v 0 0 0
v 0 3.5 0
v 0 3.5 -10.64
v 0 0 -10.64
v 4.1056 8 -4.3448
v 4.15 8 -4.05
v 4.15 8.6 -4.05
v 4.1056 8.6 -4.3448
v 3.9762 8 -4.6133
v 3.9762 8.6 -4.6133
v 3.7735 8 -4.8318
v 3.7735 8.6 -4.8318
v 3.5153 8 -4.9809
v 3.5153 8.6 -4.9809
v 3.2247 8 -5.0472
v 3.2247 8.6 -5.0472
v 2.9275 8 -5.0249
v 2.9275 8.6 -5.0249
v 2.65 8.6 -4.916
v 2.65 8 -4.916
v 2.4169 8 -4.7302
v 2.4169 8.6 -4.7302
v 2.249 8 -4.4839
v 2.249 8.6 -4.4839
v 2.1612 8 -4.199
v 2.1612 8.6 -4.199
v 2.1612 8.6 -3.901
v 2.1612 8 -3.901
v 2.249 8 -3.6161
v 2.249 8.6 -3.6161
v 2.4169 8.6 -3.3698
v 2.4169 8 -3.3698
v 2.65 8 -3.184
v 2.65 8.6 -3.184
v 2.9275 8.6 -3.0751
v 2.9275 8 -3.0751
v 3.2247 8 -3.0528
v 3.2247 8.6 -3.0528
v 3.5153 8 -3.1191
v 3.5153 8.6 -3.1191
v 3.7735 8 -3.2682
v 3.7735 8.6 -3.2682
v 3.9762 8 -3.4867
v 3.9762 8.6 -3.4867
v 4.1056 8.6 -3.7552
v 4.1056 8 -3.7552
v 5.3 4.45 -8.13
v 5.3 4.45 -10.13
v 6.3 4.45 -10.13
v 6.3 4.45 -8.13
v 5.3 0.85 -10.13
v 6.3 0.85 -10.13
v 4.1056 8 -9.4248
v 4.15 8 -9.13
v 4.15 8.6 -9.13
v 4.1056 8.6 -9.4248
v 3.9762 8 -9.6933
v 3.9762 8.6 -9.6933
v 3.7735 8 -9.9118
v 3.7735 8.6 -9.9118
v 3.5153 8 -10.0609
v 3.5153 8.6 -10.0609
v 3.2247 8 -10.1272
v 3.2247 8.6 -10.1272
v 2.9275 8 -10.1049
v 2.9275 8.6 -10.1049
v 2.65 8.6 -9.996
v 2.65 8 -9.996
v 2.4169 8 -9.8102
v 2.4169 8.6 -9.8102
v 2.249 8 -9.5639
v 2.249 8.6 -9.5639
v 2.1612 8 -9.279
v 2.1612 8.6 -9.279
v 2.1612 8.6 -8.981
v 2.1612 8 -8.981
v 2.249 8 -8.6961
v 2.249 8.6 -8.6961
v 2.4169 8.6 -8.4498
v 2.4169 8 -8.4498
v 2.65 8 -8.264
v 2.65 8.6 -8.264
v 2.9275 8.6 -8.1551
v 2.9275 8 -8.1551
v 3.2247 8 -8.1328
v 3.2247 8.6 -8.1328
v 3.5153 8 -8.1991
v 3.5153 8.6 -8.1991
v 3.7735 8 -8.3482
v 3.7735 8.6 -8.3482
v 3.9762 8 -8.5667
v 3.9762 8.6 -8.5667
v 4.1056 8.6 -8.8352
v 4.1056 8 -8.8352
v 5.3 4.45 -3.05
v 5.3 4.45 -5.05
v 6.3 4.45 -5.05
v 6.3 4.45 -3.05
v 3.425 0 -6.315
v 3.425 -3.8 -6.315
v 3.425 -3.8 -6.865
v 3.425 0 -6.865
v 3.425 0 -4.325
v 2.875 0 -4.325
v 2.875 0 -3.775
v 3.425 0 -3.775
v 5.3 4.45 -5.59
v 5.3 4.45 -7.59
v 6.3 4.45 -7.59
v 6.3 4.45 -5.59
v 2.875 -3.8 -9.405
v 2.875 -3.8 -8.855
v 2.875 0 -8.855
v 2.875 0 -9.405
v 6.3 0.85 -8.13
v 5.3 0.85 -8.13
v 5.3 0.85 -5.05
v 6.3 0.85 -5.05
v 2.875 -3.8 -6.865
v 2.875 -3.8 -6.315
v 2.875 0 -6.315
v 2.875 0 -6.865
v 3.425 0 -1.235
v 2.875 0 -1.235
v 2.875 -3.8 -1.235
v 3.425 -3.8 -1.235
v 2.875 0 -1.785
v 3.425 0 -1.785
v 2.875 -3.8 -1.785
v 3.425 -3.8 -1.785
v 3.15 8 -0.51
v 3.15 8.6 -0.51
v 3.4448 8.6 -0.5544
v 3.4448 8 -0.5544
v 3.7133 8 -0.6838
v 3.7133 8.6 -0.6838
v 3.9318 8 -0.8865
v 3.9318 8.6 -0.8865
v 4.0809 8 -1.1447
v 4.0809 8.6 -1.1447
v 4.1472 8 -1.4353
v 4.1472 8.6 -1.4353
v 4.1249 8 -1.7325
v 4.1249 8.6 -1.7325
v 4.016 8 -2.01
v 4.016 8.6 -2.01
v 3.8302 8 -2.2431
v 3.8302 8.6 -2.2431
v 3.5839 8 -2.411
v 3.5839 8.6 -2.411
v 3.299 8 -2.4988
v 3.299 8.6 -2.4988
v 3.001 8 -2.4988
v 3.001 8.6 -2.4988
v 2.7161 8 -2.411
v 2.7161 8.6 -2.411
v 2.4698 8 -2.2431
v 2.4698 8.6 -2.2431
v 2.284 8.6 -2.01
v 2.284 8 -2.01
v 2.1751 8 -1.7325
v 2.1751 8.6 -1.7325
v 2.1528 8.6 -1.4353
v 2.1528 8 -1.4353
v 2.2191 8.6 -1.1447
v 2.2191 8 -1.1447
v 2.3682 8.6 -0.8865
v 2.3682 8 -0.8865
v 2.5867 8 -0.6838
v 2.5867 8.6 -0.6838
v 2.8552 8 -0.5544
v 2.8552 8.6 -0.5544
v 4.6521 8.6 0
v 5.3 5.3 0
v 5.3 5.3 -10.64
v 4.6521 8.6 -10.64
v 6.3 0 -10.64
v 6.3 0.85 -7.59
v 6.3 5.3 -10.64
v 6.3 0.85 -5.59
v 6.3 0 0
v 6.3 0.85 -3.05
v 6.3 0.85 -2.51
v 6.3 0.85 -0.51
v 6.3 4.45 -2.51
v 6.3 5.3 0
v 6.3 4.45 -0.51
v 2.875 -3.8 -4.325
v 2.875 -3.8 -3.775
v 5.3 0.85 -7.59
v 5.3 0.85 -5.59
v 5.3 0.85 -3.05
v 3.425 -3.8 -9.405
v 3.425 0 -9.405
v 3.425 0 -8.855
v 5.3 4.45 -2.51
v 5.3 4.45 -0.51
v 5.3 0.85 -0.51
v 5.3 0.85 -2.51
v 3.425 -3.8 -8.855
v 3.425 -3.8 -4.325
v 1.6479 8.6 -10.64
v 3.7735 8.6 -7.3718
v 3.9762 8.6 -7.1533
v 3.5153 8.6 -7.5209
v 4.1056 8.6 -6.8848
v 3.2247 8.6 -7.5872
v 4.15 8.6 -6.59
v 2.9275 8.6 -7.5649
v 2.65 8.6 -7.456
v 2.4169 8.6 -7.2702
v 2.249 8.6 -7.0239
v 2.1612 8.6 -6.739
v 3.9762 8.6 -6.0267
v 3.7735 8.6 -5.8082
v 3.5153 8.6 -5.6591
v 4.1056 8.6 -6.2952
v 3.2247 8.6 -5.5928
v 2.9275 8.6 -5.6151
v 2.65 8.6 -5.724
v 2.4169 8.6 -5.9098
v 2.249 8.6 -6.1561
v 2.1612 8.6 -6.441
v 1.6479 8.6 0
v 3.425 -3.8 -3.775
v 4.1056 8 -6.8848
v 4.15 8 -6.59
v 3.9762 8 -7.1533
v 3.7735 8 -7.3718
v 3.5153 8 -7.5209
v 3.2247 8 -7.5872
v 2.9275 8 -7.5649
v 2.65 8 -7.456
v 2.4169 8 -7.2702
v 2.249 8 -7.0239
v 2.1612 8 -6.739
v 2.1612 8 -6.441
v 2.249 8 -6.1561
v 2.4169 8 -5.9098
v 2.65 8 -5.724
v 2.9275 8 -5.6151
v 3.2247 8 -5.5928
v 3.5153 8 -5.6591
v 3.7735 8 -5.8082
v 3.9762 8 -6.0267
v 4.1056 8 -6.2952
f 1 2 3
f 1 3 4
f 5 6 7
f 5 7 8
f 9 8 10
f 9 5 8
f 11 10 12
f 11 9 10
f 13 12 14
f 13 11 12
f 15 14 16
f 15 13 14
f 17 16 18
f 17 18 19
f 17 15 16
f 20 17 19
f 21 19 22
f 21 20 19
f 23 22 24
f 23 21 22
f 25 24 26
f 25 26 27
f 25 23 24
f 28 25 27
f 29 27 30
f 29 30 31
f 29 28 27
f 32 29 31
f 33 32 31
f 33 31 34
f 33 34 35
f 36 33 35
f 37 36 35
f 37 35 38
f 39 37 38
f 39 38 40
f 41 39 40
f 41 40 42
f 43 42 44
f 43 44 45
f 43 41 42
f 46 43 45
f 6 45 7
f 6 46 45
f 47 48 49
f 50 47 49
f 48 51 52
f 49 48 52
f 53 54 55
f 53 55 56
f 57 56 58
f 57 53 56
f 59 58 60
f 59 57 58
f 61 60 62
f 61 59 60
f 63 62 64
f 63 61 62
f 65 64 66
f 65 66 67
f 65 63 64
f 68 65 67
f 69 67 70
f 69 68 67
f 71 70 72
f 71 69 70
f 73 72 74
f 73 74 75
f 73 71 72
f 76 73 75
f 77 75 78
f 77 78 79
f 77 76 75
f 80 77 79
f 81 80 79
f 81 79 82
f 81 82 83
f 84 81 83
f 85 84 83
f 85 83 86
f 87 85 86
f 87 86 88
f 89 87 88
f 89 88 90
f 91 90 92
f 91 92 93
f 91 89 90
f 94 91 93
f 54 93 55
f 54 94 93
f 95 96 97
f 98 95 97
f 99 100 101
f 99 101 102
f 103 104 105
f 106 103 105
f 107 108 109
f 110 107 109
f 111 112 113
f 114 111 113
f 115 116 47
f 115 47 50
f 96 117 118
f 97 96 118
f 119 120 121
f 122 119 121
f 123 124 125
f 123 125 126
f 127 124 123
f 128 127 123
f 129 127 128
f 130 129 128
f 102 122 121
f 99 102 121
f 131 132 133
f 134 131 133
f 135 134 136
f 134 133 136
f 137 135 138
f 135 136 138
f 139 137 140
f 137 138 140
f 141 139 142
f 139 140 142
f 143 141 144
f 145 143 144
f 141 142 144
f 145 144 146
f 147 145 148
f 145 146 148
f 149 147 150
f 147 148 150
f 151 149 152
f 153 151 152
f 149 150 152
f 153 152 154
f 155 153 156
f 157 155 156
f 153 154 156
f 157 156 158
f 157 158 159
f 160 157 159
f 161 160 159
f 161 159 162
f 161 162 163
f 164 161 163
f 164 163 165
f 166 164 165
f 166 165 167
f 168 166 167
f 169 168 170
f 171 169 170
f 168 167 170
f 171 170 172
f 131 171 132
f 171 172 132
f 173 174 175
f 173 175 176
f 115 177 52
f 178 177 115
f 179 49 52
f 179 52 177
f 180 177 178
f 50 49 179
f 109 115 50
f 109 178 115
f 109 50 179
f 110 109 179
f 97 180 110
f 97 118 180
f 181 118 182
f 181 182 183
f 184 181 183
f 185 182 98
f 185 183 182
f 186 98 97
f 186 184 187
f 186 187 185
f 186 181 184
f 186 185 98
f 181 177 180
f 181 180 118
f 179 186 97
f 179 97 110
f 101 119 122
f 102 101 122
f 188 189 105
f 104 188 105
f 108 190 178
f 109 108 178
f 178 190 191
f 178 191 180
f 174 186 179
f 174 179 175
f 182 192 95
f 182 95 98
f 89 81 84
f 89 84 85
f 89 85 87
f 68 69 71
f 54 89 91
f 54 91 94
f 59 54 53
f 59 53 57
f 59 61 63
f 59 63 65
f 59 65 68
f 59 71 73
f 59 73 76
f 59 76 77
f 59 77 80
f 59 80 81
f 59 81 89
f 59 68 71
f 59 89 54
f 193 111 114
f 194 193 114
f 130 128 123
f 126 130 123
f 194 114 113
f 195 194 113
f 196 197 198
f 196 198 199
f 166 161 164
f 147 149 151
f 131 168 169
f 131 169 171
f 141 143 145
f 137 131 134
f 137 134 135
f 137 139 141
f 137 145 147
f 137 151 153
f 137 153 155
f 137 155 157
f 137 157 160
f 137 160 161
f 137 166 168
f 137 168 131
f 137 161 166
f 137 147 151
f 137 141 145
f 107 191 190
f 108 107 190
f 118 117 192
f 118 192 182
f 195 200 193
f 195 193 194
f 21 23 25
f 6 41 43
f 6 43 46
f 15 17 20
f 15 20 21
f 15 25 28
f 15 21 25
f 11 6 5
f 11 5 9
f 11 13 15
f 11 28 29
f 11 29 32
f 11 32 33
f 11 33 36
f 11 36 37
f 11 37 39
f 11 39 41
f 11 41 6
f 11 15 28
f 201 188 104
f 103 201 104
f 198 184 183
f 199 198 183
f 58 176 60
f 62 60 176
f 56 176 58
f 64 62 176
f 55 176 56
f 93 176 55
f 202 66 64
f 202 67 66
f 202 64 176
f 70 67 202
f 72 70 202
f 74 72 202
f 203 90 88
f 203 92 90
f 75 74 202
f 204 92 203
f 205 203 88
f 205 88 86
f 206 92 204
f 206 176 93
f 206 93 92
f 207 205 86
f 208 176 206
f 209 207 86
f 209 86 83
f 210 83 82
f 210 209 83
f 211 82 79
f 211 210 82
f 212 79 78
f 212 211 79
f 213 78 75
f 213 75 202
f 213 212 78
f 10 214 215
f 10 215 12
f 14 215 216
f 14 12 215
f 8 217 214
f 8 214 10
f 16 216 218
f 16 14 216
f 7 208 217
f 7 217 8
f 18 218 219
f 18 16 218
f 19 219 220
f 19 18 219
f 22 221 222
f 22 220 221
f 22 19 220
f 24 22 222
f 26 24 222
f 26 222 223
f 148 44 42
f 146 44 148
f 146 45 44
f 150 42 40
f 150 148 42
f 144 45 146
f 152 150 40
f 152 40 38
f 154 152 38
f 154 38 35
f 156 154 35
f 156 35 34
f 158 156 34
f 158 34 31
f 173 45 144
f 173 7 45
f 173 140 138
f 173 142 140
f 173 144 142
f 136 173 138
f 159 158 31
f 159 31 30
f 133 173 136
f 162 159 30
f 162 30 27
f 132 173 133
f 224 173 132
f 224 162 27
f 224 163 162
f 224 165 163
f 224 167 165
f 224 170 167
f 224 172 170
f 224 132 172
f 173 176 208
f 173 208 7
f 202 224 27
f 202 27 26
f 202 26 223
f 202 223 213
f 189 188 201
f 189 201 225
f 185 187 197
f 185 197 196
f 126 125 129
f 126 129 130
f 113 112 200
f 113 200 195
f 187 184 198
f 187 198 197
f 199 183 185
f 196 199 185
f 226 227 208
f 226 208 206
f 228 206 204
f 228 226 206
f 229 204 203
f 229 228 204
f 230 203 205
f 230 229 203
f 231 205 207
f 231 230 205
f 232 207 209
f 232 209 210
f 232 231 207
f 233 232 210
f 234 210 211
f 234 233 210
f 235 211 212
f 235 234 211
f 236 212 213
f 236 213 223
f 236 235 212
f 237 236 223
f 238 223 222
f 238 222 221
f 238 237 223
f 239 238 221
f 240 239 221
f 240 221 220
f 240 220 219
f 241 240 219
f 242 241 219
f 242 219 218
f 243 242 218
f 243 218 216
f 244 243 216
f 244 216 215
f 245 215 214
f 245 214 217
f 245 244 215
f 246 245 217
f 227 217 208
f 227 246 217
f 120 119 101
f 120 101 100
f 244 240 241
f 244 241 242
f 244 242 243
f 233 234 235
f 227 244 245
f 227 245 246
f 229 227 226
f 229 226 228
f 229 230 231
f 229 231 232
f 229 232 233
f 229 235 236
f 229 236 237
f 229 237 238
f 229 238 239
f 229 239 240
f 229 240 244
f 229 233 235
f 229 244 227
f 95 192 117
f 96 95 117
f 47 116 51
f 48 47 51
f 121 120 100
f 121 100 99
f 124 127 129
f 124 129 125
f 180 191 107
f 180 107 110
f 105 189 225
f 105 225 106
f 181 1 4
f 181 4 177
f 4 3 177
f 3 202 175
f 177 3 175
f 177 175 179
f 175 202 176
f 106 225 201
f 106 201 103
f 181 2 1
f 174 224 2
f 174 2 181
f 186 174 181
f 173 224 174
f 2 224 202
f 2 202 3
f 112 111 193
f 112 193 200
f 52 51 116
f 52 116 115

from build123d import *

# Parameters (mm, degrees)
BOSS_EXTRUDE1_DEPTH   = 10.64
SKETCH3_R             = 1
CUT_EXTRUDE1_DEPTH    = 0.6
SKETCH4_W             = 2
SKETCH4_H             = 3.6
CUT_EXTRUDE2_DEPTH    = 1
SKETCH5_W             = 0.55
SKETCH5_H             = 0.55
BOSS_EXTRUDE2_DEPTH   = 3.8
LPATTERN1_START       = 2.875
LPATTERN1_OUTLINE_W   = 3.8
LPATTERN1_OUTLINE_H   = 0.55
LPATTERN1_DEPTH       = 0.55
LPATTERN1_2_OUTLINE_W = 3.8
LPATTERN1_2_OUTLINE_H = 0.55
LPATTERN1_2_DEPTH     = 0.55
LPATTERN1_3_OUTLINE_W = 3.8
LPATTERN1_3_OUTLINE_H = 0.55
LPATTERN1_3_DEPTH     = 0.55
LPATTERN1_START_2     = 0.85
LPATTERN1_4_OUTLINE_W = 1
LPATTERN1_4_OUTLINE_H = 2
LPATTERN1_4_DEPTH     = 3.6
LPATTERN1_START_3     = 8
LPATTERN1_5_OUTLINE_R = 1
LPATTERN1_5_DEPTH     = 0.6


# Read off the part's stored shape, not the designer's step: LPattern1
with BuildPart() as part:
    # Sketch2 → Boss-Extrude1 (new body)
    with BuildSketch(Plane.XY):
        Polygon((6.3, 5.3), (5.3, 5.3), (4.652088092, 8.6), (1.647911908, 8.6), (0, 3.5), (0, 0), (6.3, 0), align=None)
    extrude(amount=-BOSS_EXTRUDE1_DEPTH)

    # Sketch3 → Cut-Extrude1 (cut)
    with BuildSketch(Plane(origin=(0, 8.6, 0), x_dir=(1, 0, 0), z_dir=(0, 1, 0))):
        with Locations(Location((3.15, 1.51, 0), (0, 0, 270))):
            Circle(SKETCH3_R)
    extrude(amount=-CUT_EXTRUDE1_DEPTH, mode=Mode.SUBTRACT)

    # Sketch4 → Cut-Extrude2 (cut)
    with BuildSketch(Plane(origin=(6.3, 0, 0), x_dir=(0, 0, -1), z_dir=(1, 0, 0))):
        with Locations((1.51, 2.65)):
            Rectangle(SKETCH4_W, SKETCH4_H)
    extrude(amount=-CUT_EXTRUDE2_DEPTH, mode=Mode.SUBTRACT)

    # LPattern1 4 outline → LPattern1 4 (cut)
    with BuildSketch(Plane(origin=(0, 0, 0), x_dir=(1, 0, 0), z_dir=(0, 1, 0)).offset(LPATTERN1_START_2)):
        with Locations((5.8, 9.13)):
            Rectangle(LPATTERN1_4_OUTLINE_W, LPATTERN1_4_OUTLINE_H)
        with Locations((5.8, 4.05)):
            Rectangle(LPATTERN1_4_OUTLINE_W, LPATTERN1_4_OUTLINE_H)
        with Locations((5.8, 6.59)):
            Rectangle(LPATTERN1_4_OUTLINE_W, LPATTERN1_4_OUTLINE_H)
    extrude(amount=LPATTERN1_4_DEPTH, mode=Mode.SUBTRACT)

    # LPattern1 5 outline → LPattern1 5 (cut)
    with BuildSketch(Plane(origin=(0, 0, 0), x_dir=(1, 0, 0), z_dir=(0, 1, 0)).offset(LPATTERN1_START_3)):
        with Locations((3.15, 9.13)):
            Circle(LPATTERN1_5_OUTLINE_R)
        with Locations((3.15, 6.59)):
            Circle(LPATTERN1_5_OUTLINE_R)
        with Locations((3.15, 4.05)):
            Circle(LPATTERN1_5_OUTLINE_R)
    extrude(amount=LPATTERN1_5_DEPTH, mode=Mode.SUBTRACT)


with BuildPart() as body_2:
    # Sketch5 → Boss-Extrude2 (new body)
    with BuildSketch(Plane.XZ):
        with Locations((3.15, -1.51)):
            Rectangle(SKETCH5_W, SKETCH5_H)
    extrude(amount=BOSS_EXTRUDE2_DEPTH)


with BuildPart() as body_3:
    # LPattern1 outline → LPattern1 (new body)
    with BuildSketch(Plane.YZ.offset(LPATTERN1_START)):
        with Locations((-1.9, -9.13)):
            Rectangle(LPATTERN1_OUTLINE_W, LPATTERN1_OUTLINE_H)
    extrude(amount=LPATTERN1_DEPTH)


with BuildPart() as body_4:
    # LPattern1 2 outline → LPattern1 2 (new body)
    with BuildSketch(Plane.YZ.offset(LPATTERN1_START)):
        with Locations((-1.9, -6.59)):
            Rectangle(LPATTERN1_2_OUTLINE_W, LPATTERN1_2_OUTLINE_H)
    extrude(amount=LPATTERN1_2_DEPTH)


with BuildPart() as body_5:
    # LPattern1 3 outline → LPattern1 3 (new body)
    with BuildSketch(Plane.YZ.offset(LPATTERN1_START)):
        with Locations((-1.9, -4.05)):
            Rectangle(LPATTERN1_3_OUTLINE_W, LPATTERN1_3_OUTLINE_H)
    extrude(amount=LPATTERN1_3_DEPTH)


solid = Compound([part.part, body_2.part, body_3.part, body_4.part, body_5.part])
